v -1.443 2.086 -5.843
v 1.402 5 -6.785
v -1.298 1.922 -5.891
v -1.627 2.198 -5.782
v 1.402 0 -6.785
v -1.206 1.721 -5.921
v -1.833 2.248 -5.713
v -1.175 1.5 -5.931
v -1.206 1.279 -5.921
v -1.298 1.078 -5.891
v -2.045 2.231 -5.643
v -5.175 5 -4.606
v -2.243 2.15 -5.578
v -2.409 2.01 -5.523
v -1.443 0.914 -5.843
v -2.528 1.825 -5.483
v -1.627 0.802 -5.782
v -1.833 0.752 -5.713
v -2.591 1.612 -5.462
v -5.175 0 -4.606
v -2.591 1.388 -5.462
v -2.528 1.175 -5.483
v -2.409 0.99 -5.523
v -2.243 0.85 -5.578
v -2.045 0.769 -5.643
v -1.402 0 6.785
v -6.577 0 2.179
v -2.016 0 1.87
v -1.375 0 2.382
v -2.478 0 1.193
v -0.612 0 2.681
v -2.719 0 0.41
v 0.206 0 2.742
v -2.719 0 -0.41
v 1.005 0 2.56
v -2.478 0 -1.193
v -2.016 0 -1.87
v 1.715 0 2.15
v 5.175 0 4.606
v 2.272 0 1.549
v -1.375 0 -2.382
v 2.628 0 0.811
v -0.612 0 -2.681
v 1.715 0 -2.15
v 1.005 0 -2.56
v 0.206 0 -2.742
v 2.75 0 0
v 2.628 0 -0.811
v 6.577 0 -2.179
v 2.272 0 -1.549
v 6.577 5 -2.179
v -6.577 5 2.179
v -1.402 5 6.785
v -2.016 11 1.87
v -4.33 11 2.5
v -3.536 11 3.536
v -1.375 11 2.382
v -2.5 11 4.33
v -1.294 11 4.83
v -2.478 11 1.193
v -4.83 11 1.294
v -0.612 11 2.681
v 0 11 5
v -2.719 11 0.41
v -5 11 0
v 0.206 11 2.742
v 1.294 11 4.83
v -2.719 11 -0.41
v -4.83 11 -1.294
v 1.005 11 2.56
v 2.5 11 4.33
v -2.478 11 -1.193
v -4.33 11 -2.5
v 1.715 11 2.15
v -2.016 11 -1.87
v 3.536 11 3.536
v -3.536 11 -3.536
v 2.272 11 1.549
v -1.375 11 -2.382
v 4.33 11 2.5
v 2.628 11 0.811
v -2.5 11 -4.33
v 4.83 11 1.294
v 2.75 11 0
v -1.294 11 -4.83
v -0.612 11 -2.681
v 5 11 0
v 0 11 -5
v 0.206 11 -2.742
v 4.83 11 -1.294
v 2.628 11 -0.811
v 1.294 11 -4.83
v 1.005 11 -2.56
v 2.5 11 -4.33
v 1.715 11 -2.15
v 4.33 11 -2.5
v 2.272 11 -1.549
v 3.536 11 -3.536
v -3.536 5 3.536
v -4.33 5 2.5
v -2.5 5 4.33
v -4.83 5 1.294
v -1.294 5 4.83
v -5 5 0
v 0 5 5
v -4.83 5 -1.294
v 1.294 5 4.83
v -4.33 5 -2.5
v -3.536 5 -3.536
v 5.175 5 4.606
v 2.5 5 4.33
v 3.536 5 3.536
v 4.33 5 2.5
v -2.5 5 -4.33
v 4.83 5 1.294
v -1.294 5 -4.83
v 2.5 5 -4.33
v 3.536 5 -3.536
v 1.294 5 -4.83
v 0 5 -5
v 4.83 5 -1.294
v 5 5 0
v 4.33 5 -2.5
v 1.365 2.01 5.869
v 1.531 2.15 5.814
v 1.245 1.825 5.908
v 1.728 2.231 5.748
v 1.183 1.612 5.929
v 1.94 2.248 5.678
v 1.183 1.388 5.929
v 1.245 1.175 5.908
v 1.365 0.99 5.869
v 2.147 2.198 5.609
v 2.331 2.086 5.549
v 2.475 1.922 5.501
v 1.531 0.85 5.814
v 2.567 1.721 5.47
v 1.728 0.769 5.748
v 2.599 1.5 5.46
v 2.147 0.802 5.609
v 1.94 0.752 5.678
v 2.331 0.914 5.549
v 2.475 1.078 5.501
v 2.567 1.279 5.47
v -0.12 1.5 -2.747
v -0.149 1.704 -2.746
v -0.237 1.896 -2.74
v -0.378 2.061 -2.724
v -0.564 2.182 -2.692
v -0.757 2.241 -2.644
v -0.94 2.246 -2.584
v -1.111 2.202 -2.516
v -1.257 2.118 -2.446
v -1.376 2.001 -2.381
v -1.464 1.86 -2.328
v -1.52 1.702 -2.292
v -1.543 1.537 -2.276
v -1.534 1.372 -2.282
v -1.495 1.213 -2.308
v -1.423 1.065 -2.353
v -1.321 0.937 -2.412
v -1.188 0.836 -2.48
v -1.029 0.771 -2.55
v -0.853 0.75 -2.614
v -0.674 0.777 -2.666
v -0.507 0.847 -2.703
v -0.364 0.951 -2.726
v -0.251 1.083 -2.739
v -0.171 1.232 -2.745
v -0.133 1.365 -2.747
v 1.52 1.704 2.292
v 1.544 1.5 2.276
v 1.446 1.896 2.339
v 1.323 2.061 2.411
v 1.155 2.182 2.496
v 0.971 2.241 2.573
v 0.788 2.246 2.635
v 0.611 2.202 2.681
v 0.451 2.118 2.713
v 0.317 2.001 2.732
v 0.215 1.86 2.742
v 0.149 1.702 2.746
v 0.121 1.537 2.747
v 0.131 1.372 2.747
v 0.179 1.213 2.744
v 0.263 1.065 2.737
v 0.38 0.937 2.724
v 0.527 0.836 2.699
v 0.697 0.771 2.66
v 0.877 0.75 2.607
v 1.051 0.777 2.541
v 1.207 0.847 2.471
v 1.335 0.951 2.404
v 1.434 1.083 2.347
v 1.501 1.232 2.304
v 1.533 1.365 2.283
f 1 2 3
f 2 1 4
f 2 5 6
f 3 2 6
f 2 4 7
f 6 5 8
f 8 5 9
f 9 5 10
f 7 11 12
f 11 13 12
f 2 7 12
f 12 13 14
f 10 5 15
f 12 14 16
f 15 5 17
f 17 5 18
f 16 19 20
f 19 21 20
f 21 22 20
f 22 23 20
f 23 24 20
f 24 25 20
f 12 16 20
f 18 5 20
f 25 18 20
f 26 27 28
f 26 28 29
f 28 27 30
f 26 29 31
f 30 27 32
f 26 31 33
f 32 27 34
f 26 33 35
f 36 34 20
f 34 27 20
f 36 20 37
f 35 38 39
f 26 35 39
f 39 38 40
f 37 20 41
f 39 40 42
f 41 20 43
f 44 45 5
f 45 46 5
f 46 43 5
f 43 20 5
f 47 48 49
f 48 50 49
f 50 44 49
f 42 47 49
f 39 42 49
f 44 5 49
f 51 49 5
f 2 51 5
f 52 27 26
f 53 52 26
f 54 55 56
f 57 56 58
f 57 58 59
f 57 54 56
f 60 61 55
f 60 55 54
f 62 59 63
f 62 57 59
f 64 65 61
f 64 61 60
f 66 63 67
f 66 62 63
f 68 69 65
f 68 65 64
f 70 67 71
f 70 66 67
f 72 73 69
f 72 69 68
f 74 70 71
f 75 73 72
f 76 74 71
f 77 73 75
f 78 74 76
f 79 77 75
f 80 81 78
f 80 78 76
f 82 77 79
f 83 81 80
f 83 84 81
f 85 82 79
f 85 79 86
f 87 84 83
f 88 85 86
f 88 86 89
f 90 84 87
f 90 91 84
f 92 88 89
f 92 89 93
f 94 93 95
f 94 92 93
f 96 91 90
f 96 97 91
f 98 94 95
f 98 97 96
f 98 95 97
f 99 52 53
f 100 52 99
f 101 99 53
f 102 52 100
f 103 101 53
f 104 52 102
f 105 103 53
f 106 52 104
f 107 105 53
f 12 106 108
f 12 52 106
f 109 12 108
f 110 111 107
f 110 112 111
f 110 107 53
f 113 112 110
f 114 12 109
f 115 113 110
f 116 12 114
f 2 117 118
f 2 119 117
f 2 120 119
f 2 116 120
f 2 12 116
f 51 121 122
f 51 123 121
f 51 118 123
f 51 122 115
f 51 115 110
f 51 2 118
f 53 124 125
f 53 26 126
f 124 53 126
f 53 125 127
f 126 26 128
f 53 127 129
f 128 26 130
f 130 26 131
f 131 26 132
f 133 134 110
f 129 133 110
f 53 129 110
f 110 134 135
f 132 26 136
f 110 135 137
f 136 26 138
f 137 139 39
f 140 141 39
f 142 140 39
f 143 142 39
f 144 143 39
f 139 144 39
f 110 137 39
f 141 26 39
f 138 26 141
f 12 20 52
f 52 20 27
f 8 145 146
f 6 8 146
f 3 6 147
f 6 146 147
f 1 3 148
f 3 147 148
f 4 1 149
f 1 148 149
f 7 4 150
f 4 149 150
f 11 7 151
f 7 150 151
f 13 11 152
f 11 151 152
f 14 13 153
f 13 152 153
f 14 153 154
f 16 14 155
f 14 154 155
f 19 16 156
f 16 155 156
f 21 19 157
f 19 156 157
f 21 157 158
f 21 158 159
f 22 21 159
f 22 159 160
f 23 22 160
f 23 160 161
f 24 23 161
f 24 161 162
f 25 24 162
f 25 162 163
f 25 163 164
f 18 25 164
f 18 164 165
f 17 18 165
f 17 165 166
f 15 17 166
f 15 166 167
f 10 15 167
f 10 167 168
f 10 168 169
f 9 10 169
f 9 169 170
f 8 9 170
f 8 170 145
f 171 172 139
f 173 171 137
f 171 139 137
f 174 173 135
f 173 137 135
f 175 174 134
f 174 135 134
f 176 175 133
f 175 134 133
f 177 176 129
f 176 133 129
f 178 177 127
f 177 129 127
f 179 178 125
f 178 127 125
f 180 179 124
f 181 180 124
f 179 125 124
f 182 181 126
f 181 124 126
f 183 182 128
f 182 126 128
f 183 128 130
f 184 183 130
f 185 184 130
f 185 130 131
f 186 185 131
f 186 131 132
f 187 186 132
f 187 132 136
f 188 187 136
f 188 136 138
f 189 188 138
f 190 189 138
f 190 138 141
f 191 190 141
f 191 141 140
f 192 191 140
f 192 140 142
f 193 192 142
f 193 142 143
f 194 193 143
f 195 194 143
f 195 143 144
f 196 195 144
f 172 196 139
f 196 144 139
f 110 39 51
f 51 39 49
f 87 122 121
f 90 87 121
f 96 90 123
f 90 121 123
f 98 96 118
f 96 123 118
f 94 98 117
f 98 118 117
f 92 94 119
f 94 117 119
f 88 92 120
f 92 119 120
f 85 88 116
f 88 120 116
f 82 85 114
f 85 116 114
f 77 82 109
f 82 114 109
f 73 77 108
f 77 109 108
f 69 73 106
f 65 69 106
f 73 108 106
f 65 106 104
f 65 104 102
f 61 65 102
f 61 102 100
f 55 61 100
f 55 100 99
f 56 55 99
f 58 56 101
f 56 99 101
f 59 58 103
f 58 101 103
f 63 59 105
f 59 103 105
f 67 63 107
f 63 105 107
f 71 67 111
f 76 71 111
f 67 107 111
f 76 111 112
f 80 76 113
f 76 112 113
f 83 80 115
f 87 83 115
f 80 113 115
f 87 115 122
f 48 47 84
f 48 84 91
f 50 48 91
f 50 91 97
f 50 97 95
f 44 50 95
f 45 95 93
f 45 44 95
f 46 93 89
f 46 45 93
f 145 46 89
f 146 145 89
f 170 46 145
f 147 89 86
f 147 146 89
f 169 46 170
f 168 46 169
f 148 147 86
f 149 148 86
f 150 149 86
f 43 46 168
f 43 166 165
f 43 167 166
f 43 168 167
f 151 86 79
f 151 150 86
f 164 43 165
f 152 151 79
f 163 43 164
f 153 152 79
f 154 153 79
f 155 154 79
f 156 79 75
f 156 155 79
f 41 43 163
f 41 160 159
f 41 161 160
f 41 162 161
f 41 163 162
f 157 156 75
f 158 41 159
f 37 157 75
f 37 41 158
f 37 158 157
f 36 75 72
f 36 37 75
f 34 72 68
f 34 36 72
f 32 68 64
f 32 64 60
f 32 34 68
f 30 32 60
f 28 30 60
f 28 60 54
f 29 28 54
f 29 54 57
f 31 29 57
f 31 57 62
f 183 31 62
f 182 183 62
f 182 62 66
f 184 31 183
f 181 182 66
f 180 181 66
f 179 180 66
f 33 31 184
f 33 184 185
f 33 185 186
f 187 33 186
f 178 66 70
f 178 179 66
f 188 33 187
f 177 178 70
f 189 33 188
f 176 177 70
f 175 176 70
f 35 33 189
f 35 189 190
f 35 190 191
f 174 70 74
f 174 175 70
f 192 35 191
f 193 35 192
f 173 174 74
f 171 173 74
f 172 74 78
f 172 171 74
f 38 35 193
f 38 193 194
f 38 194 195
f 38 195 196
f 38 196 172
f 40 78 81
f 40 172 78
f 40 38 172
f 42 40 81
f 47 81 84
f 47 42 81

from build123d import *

# Parameters (mm, degrees)
CROQUIS1_R              = 2.75
SALIENTE_EXTRUIR1_DEPTH = 5
CROQUIS3_R              = 5
CROQUIS3_R_2            = 2.75
SALIENTE_EXTRUIR2_DEPTH = 6
CROQUIS2_R              = 0.75
CORTAR_EXTRUIR1_DEPTH   = 15.508806178


with BuildPart() as part:
    # Croquis1 → Saliente-Extruir1 (new body)
    with BuildSketch(Plane(origin=(0, 0, 0), x_dir=(1, 0, 0), z_dir=(0, 1, 0))):
        Polygon((1.401704423, 6.784926286), (-5.175066315, 4.606374782), (-6.576770738, -2.178551504), (-1.401704423, -6.784926286), (5.175066315, -4.606374782), (6.576770738, 2.178551504), align=None)
        Circle(CROQUIS1_R, mode=Mode.SUBTRACT)
    extrude(amount=SALIENTE_EXTRUIR1_DEPTH)

    # Croquis3 → Saliente-Extruir2 (add)
    with BuildSketch(Plane(origin=(0, 5, 0), x_dir=(1, 0, 0), z_dir=(0, 1, 0))):
        Circle(CROQUIS3_R)
        Circle(CROQUIS3_R_2, mode=Mode.SUBTRACT)
    extrude(amount=SALIENTE_EXTRUIR2_DEPTH)

    # Croquis2 → Cortar-Extruir1 (cut, through all)
    with BuildSketch(Plane(origin=(1.886680946, 0, 5.695650534), x_dir=(0.949275089, 0, -0.314446824), z_dir=(0.314446824, 0, 0.949275089))):
        with Locations((0, 1.5)):
            Circle(CROQUIS2_R)
    extrude(amount=-CORTAR_EXTRUIR1_DEPTH, mode=Mode.SUBTRACT)


solid = part.part
